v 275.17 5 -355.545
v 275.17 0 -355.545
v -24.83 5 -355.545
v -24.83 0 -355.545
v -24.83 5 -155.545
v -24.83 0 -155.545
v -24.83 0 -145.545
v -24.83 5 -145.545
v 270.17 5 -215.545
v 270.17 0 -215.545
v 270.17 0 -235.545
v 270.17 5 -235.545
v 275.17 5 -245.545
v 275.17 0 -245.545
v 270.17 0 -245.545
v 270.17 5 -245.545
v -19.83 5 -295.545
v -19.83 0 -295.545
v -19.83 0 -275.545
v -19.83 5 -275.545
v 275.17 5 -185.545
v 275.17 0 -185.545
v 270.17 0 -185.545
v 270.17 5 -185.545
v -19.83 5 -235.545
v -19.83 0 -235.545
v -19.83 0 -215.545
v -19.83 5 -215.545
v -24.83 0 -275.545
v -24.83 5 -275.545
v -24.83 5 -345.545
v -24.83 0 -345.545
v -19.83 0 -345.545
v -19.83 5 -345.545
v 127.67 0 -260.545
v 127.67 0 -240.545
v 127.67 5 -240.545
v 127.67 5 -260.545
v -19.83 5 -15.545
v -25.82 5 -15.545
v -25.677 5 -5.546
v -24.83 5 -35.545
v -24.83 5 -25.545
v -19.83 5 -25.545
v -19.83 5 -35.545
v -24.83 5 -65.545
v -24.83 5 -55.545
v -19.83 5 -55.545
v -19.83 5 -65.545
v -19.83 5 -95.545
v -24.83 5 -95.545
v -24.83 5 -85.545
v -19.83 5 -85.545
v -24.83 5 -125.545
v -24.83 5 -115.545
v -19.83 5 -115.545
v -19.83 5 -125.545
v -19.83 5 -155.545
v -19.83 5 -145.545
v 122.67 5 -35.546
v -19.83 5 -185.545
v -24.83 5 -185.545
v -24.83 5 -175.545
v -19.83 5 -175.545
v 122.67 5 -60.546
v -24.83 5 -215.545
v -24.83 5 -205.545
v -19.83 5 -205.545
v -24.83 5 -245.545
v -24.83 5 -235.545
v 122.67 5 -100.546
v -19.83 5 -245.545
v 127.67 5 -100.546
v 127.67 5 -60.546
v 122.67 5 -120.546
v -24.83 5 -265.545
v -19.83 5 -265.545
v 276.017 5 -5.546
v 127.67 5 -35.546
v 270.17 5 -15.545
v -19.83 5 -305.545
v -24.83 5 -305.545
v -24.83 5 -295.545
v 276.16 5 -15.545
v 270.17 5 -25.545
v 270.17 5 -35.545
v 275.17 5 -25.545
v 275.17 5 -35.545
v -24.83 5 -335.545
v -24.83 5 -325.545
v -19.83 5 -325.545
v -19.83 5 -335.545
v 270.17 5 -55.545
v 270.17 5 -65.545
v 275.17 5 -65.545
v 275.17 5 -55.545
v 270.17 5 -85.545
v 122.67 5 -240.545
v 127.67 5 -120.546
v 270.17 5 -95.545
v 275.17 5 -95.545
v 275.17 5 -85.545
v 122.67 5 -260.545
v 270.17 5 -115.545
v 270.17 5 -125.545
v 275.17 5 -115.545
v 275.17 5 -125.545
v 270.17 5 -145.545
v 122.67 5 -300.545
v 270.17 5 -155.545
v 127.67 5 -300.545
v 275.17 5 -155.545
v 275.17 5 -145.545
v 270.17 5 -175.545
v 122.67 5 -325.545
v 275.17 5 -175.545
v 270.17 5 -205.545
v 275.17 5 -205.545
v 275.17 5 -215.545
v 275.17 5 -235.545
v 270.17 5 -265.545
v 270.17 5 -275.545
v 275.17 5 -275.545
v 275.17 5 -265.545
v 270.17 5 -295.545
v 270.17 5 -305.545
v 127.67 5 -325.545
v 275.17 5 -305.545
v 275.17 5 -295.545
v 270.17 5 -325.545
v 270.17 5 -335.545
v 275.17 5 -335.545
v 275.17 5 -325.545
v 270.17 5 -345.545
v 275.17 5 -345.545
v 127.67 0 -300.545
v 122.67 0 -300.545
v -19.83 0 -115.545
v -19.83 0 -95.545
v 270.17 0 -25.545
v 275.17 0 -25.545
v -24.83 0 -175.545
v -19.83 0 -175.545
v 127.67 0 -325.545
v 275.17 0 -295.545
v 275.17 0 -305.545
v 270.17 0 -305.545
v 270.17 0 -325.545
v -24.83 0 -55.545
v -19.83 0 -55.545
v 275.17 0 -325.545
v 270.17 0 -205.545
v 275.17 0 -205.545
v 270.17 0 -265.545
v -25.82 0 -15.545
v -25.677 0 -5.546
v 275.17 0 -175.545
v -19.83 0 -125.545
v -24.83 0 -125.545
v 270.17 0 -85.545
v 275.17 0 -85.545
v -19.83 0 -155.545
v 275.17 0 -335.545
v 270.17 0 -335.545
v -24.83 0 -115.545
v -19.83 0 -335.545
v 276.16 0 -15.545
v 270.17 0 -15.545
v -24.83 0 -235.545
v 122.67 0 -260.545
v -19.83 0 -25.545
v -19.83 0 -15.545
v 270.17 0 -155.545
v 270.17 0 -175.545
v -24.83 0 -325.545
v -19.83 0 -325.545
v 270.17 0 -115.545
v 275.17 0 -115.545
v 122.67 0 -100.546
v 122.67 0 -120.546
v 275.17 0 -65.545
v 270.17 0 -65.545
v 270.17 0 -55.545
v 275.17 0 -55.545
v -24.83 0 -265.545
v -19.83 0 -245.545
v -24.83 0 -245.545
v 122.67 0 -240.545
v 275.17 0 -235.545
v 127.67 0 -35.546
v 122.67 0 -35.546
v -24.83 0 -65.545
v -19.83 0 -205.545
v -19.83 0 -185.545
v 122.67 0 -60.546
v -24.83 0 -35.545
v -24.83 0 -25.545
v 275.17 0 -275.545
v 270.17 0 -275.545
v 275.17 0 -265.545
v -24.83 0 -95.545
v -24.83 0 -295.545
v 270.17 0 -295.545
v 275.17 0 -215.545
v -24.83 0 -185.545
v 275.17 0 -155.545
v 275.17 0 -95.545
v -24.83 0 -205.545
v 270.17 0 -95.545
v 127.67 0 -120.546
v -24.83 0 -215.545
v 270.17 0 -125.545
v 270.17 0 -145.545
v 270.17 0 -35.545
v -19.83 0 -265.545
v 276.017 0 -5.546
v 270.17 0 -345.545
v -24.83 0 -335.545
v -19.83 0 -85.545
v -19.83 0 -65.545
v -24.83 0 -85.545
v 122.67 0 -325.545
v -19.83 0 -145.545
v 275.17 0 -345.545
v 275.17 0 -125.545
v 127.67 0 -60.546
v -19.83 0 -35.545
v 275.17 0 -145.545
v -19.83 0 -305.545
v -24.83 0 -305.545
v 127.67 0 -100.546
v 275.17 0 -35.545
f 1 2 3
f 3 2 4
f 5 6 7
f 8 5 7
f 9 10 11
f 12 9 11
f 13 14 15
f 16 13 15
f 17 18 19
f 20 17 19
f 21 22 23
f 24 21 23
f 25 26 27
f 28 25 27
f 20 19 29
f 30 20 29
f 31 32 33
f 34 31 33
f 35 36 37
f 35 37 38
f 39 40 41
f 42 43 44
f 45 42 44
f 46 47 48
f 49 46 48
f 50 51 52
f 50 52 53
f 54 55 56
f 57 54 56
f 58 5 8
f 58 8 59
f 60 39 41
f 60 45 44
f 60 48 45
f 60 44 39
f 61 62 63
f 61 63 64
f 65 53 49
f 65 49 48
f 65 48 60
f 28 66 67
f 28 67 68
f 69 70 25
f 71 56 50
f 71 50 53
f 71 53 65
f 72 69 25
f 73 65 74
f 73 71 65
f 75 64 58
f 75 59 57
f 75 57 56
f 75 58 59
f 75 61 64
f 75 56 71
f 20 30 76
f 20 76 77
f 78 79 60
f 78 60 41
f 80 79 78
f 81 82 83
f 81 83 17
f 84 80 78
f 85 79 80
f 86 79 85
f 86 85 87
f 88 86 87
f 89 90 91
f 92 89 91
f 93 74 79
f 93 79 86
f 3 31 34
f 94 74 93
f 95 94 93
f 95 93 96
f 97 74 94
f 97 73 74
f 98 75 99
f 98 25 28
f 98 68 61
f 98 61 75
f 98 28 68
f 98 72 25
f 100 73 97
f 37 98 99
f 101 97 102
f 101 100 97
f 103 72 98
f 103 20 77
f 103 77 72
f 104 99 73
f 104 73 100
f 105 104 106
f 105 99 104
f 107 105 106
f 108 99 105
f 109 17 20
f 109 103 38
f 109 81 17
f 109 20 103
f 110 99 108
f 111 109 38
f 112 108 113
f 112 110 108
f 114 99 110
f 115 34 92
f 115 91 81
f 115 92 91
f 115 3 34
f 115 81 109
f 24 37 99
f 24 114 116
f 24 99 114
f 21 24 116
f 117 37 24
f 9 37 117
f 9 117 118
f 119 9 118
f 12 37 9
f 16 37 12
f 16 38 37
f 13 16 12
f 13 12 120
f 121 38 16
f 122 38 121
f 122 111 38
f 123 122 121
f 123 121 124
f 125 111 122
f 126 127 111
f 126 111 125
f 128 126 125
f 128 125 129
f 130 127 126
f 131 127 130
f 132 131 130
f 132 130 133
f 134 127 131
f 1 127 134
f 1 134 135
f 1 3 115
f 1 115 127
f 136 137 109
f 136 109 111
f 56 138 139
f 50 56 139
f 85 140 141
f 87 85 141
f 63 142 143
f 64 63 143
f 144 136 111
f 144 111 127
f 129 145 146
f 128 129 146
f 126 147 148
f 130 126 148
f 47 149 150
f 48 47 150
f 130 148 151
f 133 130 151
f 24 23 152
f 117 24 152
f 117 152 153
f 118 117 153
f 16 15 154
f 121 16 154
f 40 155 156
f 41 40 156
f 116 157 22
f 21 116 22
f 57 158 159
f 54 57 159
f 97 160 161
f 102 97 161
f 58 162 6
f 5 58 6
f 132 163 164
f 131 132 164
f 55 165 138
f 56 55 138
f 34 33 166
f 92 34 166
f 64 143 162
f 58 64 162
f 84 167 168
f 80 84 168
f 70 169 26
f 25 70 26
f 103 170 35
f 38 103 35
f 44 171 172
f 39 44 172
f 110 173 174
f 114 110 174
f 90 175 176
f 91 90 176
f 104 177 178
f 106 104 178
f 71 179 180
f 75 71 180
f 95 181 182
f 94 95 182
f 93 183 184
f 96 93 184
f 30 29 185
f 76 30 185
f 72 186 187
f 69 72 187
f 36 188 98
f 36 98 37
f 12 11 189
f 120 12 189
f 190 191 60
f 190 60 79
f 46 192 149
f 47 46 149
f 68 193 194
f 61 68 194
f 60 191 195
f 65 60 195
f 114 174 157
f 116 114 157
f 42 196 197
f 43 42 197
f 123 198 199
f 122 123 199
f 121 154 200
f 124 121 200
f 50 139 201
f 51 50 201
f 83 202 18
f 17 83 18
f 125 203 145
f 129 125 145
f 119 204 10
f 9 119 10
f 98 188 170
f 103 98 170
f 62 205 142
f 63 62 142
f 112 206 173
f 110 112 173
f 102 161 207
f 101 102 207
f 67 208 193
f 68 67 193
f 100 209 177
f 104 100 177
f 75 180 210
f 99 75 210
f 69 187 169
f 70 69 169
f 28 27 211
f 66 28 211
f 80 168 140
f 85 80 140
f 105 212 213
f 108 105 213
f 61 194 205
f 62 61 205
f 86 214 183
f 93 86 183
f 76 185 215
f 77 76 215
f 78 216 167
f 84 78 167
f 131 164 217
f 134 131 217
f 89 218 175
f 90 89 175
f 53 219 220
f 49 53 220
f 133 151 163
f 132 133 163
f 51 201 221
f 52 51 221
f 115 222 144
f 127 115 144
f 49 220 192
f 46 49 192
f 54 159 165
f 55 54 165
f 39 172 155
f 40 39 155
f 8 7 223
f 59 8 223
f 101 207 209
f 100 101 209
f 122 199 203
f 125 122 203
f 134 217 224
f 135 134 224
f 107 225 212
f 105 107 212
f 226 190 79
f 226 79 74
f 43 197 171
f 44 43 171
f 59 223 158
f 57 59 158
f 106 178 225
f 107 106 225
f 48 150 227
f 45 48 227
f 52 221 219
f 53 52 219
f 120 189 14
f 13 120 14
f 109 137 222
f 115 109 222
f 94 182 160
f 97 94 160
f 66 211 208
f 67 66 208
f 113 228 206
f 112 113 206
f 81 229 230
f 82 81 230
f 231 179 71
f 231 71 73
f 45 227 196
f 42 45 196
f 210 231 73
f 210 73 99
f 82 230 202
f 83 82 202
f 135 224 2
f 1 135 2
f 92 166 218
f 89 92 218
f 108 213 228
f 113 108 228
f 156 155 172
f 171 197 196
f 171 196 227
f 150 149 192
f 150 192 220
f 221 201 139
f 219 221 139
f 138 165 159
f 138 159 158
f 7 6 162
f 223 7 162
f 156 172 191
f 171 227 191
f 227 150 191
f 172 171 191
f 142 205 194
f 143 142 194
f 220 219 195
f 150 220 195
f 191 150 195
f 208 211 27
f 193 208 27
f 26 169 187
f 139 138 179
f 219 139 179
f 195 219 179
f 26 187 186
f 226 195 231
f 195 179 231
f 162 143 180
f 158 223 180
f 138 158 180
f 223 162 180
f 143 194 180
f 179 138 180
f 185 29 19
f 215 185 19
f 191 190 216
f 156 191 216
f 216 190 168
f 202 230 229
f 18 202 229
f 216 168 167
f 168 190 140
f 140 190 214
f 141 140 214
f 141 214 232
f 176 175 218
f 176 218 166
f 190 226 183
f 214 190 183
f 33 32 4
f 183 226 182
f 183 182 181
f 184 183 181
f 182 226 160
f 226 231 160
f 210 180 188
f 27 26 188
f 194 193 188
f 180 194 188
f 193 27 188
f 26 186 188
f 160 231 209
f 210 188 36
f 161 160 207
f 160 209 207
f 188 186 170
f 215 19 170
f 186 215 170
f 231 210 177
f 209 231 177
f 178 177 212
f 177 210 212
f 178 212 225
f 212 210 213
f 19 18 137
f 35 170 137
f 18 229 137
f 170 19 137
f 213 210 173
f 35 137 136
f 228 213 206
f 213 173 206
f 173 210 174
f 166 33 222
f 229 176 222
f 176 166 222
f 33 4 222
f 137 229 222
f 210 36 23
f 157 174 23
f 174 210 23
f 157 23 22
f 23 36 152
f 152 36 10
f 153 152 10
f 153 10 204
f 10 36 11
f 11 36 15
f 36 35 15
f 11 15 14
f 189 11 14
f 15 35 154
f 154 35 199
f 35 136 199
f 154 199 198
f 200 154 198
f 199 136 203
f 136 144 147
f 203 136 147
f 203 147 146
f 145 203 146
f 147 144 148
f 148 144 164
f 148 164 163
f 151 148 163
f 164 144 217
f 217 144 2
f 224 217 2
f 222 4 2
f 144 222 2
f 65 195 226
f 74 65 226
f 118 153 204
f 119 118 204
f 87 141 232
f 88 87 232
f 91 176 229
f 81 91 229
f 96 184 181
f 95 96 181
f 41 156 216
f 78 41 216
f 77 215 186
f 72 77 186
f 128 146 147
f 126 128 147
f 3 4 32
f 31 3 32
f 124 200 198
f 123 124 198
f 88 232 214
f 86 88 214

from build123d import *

# Parameters (mm, degrees)
SKETCH1_W           = 5
SKETCH1_H           = 25
SKETCH1_H_2         = 20
BOSS_EXTRUDE2_DEPTH = 5


with BuildPart() as part:
    # Sketch1 → Boss-Extrude2 (new body)
    with BuildSketch(Plane(origin=(0, 0, 0), x_dir=(1, 0, 0), z_dir=(0, 1, 0))):
        Polygon((-24.829979235, 345.545008259), (-19.829979235, 345.545008259), (-19.829979235, 335.545008259), (-24.829979235, 335.545008259), (-24.829979235, 325.545008259), (-19.829979235, 325.545008259), (-19.829979235, 315.545008259), (-19.829979235, 305.545008259), (-24.829979235, 305.545008259), (-24.829979235, 295.545008259), (-19.829979235, 295.545008259), (-19.829979235, 285.545008259), (-19.829979235, 275.545008259), (-24.829979235, 275.545008259), (-24.829979235, 265.545008259), (-19.829979235, 265.545008259), (-19.829979235, 255.545008259), (-19.829979235, 245.545008259), (-24.829979235, 245.545008259), (-24.829979235, 235.545008259), (-19.829979235, 235.545008259), (-19.829979235, 225.545008259), (-19.829979235, 215.545008259), (-24.829979235, 215.545008259), (-24.829979235, 205.545008259), (-19.829979235, 205.545008259), (-19.829979235, 195.545008259), (-19.829979235, 185.545008259), (-24.829979235, 185.545008259), (-24.829979235, 175.545008259), (-19.829979235, 175.545008259), (-19.829979235, 165.545008259), (-19.829979235, 155.545008259), (-24.829979235, 155.545008259), (-24.829979235, 145.545008259), (-19.829979235, 145.545008259), (-19.829979235, 135.545008259), (-19.829979235, 125.545008259), (-24.829979235, 125.545008259), (-24.829979235, 115.545008259), (-19.829979235, 115.545008259), (-19.829979235, 105.545008259), (-19.829979235, 95.545008259), (-24.829979235, 95.545008259), (-24.829979235, 85.545008259), (-19.829979235, 85.545008259), (-19.829979235, 75.545008259), (-19.829979235, 65.545008259), (-24.829979235, 65.545008259), (-24.829979235, 55.545008259), (-19.829979235, 55.545008259), (-19.829979235, 45.545008259), (-19.829979235, 35.545008259), (-24.829979235, 35.545008259), (-24.829979235, 25.545008259), (-19.829979235, 25.545008259), (-19.829979235, 15.545008259), (-25.820121993, 15.545008259), (-25.676959723, 5.546033083), (276.017001253, 5.546033083), (276.160163523, 15.545008259), (270.170020765, 15.545008259), (270.170020765, 25.545008259), (275.170020765, 25.545008259), (275.170020765, 35.545008259), (270.170020765, 35.545008259), (270.170020765, 45.545008259), (270.170020765, 55.545008259), (275.170020765, 55.545008259), (275.170020765, 65.545008259), (270.170020765, 65.545008259), (270.170020765, 75.545008259), (270.170020765, 85.545008259), (275.170020765, 85.545008259), (275.170020765, 95.545008259), (270.170020765, 95.545008259), (270.170020765, 105.545008259), (270.170020765, 115.545008259), (275.170020765, 115.545008259), (275.170020765, 125.545008259), (270.170020765, 125.545008259), (270.170020765, 135.545008259), (270.170020765, 145.545008259), (275.170020765, 145.545008259), (275.170020765, 155.545008259), (270.170020765, 155.545008259), (270.170020765, 165.545008259), (270.170020765, 175.545008259), (275.170020765, 175.545008259), (275.170020765, 185.545008259), (270.170020765, 185.545008259), (270.170020765, 195.545008259), (270.170020765, 205.545008259), (275.170020765, 205.545008259), (275.170020765, 215.545008259), (270.170020765, 215.545008259), (270.170020765, 225.545008259), (270.170020765, 235.545008259), (275.170020765, 235.545008259), (275.170020765, 245.545008259), (270.170020765, 245.545008259), (270.170020765, 255.545008259), (270.170020765, 265.545008259), (275.170020765, 265.545008259), (275.170020765, 275.545008259), (270.170020765, 275.545008259), (270.170020765, 285.545008259), (270.170020765, 295.545008259), (275.170020765, 295.545008259), (275.170020765, 305.545008259), (270.170020765, 305.545008259), (270.170020765, 315.545008259), (270.170020765, 325.545008259), (275.170020765, 325.545008259), (275.170020765, 335.545008259), (270.170020765, 335.545008259), (270.170020765, 345.545008259), (275.170020765, 345.545008259), (275.170020765, 355.545008259), (-24.829979235, 355.545008259), align=None)
        with Locations((125.170020765, 313.045008259)):
            Rectangle(SKETCH1_W, SKETCH1_H, mode=Mode.SUBTRACT)
        with Locations((125.170020765, 48.046033083)):
            Rectangle(SKETCH1_W, SKETCH1_H, mode=Mode.SUBTRACT)
        with Locations((125.170020765, 250.545008259)):
            Rectangle(SKETCH1_W, SKETCH1_H_2, mode=Mode.SUBTRACT)
        with Locations((125.170020765, 110.546033083)):
            Rectangle(SKETCH1_W, SKETCH1_H_2, mode=Mode.SUBTRACT)
    extrude(amount=BOSS_EXTRUDE2_DEPTH)


solid = part.part
